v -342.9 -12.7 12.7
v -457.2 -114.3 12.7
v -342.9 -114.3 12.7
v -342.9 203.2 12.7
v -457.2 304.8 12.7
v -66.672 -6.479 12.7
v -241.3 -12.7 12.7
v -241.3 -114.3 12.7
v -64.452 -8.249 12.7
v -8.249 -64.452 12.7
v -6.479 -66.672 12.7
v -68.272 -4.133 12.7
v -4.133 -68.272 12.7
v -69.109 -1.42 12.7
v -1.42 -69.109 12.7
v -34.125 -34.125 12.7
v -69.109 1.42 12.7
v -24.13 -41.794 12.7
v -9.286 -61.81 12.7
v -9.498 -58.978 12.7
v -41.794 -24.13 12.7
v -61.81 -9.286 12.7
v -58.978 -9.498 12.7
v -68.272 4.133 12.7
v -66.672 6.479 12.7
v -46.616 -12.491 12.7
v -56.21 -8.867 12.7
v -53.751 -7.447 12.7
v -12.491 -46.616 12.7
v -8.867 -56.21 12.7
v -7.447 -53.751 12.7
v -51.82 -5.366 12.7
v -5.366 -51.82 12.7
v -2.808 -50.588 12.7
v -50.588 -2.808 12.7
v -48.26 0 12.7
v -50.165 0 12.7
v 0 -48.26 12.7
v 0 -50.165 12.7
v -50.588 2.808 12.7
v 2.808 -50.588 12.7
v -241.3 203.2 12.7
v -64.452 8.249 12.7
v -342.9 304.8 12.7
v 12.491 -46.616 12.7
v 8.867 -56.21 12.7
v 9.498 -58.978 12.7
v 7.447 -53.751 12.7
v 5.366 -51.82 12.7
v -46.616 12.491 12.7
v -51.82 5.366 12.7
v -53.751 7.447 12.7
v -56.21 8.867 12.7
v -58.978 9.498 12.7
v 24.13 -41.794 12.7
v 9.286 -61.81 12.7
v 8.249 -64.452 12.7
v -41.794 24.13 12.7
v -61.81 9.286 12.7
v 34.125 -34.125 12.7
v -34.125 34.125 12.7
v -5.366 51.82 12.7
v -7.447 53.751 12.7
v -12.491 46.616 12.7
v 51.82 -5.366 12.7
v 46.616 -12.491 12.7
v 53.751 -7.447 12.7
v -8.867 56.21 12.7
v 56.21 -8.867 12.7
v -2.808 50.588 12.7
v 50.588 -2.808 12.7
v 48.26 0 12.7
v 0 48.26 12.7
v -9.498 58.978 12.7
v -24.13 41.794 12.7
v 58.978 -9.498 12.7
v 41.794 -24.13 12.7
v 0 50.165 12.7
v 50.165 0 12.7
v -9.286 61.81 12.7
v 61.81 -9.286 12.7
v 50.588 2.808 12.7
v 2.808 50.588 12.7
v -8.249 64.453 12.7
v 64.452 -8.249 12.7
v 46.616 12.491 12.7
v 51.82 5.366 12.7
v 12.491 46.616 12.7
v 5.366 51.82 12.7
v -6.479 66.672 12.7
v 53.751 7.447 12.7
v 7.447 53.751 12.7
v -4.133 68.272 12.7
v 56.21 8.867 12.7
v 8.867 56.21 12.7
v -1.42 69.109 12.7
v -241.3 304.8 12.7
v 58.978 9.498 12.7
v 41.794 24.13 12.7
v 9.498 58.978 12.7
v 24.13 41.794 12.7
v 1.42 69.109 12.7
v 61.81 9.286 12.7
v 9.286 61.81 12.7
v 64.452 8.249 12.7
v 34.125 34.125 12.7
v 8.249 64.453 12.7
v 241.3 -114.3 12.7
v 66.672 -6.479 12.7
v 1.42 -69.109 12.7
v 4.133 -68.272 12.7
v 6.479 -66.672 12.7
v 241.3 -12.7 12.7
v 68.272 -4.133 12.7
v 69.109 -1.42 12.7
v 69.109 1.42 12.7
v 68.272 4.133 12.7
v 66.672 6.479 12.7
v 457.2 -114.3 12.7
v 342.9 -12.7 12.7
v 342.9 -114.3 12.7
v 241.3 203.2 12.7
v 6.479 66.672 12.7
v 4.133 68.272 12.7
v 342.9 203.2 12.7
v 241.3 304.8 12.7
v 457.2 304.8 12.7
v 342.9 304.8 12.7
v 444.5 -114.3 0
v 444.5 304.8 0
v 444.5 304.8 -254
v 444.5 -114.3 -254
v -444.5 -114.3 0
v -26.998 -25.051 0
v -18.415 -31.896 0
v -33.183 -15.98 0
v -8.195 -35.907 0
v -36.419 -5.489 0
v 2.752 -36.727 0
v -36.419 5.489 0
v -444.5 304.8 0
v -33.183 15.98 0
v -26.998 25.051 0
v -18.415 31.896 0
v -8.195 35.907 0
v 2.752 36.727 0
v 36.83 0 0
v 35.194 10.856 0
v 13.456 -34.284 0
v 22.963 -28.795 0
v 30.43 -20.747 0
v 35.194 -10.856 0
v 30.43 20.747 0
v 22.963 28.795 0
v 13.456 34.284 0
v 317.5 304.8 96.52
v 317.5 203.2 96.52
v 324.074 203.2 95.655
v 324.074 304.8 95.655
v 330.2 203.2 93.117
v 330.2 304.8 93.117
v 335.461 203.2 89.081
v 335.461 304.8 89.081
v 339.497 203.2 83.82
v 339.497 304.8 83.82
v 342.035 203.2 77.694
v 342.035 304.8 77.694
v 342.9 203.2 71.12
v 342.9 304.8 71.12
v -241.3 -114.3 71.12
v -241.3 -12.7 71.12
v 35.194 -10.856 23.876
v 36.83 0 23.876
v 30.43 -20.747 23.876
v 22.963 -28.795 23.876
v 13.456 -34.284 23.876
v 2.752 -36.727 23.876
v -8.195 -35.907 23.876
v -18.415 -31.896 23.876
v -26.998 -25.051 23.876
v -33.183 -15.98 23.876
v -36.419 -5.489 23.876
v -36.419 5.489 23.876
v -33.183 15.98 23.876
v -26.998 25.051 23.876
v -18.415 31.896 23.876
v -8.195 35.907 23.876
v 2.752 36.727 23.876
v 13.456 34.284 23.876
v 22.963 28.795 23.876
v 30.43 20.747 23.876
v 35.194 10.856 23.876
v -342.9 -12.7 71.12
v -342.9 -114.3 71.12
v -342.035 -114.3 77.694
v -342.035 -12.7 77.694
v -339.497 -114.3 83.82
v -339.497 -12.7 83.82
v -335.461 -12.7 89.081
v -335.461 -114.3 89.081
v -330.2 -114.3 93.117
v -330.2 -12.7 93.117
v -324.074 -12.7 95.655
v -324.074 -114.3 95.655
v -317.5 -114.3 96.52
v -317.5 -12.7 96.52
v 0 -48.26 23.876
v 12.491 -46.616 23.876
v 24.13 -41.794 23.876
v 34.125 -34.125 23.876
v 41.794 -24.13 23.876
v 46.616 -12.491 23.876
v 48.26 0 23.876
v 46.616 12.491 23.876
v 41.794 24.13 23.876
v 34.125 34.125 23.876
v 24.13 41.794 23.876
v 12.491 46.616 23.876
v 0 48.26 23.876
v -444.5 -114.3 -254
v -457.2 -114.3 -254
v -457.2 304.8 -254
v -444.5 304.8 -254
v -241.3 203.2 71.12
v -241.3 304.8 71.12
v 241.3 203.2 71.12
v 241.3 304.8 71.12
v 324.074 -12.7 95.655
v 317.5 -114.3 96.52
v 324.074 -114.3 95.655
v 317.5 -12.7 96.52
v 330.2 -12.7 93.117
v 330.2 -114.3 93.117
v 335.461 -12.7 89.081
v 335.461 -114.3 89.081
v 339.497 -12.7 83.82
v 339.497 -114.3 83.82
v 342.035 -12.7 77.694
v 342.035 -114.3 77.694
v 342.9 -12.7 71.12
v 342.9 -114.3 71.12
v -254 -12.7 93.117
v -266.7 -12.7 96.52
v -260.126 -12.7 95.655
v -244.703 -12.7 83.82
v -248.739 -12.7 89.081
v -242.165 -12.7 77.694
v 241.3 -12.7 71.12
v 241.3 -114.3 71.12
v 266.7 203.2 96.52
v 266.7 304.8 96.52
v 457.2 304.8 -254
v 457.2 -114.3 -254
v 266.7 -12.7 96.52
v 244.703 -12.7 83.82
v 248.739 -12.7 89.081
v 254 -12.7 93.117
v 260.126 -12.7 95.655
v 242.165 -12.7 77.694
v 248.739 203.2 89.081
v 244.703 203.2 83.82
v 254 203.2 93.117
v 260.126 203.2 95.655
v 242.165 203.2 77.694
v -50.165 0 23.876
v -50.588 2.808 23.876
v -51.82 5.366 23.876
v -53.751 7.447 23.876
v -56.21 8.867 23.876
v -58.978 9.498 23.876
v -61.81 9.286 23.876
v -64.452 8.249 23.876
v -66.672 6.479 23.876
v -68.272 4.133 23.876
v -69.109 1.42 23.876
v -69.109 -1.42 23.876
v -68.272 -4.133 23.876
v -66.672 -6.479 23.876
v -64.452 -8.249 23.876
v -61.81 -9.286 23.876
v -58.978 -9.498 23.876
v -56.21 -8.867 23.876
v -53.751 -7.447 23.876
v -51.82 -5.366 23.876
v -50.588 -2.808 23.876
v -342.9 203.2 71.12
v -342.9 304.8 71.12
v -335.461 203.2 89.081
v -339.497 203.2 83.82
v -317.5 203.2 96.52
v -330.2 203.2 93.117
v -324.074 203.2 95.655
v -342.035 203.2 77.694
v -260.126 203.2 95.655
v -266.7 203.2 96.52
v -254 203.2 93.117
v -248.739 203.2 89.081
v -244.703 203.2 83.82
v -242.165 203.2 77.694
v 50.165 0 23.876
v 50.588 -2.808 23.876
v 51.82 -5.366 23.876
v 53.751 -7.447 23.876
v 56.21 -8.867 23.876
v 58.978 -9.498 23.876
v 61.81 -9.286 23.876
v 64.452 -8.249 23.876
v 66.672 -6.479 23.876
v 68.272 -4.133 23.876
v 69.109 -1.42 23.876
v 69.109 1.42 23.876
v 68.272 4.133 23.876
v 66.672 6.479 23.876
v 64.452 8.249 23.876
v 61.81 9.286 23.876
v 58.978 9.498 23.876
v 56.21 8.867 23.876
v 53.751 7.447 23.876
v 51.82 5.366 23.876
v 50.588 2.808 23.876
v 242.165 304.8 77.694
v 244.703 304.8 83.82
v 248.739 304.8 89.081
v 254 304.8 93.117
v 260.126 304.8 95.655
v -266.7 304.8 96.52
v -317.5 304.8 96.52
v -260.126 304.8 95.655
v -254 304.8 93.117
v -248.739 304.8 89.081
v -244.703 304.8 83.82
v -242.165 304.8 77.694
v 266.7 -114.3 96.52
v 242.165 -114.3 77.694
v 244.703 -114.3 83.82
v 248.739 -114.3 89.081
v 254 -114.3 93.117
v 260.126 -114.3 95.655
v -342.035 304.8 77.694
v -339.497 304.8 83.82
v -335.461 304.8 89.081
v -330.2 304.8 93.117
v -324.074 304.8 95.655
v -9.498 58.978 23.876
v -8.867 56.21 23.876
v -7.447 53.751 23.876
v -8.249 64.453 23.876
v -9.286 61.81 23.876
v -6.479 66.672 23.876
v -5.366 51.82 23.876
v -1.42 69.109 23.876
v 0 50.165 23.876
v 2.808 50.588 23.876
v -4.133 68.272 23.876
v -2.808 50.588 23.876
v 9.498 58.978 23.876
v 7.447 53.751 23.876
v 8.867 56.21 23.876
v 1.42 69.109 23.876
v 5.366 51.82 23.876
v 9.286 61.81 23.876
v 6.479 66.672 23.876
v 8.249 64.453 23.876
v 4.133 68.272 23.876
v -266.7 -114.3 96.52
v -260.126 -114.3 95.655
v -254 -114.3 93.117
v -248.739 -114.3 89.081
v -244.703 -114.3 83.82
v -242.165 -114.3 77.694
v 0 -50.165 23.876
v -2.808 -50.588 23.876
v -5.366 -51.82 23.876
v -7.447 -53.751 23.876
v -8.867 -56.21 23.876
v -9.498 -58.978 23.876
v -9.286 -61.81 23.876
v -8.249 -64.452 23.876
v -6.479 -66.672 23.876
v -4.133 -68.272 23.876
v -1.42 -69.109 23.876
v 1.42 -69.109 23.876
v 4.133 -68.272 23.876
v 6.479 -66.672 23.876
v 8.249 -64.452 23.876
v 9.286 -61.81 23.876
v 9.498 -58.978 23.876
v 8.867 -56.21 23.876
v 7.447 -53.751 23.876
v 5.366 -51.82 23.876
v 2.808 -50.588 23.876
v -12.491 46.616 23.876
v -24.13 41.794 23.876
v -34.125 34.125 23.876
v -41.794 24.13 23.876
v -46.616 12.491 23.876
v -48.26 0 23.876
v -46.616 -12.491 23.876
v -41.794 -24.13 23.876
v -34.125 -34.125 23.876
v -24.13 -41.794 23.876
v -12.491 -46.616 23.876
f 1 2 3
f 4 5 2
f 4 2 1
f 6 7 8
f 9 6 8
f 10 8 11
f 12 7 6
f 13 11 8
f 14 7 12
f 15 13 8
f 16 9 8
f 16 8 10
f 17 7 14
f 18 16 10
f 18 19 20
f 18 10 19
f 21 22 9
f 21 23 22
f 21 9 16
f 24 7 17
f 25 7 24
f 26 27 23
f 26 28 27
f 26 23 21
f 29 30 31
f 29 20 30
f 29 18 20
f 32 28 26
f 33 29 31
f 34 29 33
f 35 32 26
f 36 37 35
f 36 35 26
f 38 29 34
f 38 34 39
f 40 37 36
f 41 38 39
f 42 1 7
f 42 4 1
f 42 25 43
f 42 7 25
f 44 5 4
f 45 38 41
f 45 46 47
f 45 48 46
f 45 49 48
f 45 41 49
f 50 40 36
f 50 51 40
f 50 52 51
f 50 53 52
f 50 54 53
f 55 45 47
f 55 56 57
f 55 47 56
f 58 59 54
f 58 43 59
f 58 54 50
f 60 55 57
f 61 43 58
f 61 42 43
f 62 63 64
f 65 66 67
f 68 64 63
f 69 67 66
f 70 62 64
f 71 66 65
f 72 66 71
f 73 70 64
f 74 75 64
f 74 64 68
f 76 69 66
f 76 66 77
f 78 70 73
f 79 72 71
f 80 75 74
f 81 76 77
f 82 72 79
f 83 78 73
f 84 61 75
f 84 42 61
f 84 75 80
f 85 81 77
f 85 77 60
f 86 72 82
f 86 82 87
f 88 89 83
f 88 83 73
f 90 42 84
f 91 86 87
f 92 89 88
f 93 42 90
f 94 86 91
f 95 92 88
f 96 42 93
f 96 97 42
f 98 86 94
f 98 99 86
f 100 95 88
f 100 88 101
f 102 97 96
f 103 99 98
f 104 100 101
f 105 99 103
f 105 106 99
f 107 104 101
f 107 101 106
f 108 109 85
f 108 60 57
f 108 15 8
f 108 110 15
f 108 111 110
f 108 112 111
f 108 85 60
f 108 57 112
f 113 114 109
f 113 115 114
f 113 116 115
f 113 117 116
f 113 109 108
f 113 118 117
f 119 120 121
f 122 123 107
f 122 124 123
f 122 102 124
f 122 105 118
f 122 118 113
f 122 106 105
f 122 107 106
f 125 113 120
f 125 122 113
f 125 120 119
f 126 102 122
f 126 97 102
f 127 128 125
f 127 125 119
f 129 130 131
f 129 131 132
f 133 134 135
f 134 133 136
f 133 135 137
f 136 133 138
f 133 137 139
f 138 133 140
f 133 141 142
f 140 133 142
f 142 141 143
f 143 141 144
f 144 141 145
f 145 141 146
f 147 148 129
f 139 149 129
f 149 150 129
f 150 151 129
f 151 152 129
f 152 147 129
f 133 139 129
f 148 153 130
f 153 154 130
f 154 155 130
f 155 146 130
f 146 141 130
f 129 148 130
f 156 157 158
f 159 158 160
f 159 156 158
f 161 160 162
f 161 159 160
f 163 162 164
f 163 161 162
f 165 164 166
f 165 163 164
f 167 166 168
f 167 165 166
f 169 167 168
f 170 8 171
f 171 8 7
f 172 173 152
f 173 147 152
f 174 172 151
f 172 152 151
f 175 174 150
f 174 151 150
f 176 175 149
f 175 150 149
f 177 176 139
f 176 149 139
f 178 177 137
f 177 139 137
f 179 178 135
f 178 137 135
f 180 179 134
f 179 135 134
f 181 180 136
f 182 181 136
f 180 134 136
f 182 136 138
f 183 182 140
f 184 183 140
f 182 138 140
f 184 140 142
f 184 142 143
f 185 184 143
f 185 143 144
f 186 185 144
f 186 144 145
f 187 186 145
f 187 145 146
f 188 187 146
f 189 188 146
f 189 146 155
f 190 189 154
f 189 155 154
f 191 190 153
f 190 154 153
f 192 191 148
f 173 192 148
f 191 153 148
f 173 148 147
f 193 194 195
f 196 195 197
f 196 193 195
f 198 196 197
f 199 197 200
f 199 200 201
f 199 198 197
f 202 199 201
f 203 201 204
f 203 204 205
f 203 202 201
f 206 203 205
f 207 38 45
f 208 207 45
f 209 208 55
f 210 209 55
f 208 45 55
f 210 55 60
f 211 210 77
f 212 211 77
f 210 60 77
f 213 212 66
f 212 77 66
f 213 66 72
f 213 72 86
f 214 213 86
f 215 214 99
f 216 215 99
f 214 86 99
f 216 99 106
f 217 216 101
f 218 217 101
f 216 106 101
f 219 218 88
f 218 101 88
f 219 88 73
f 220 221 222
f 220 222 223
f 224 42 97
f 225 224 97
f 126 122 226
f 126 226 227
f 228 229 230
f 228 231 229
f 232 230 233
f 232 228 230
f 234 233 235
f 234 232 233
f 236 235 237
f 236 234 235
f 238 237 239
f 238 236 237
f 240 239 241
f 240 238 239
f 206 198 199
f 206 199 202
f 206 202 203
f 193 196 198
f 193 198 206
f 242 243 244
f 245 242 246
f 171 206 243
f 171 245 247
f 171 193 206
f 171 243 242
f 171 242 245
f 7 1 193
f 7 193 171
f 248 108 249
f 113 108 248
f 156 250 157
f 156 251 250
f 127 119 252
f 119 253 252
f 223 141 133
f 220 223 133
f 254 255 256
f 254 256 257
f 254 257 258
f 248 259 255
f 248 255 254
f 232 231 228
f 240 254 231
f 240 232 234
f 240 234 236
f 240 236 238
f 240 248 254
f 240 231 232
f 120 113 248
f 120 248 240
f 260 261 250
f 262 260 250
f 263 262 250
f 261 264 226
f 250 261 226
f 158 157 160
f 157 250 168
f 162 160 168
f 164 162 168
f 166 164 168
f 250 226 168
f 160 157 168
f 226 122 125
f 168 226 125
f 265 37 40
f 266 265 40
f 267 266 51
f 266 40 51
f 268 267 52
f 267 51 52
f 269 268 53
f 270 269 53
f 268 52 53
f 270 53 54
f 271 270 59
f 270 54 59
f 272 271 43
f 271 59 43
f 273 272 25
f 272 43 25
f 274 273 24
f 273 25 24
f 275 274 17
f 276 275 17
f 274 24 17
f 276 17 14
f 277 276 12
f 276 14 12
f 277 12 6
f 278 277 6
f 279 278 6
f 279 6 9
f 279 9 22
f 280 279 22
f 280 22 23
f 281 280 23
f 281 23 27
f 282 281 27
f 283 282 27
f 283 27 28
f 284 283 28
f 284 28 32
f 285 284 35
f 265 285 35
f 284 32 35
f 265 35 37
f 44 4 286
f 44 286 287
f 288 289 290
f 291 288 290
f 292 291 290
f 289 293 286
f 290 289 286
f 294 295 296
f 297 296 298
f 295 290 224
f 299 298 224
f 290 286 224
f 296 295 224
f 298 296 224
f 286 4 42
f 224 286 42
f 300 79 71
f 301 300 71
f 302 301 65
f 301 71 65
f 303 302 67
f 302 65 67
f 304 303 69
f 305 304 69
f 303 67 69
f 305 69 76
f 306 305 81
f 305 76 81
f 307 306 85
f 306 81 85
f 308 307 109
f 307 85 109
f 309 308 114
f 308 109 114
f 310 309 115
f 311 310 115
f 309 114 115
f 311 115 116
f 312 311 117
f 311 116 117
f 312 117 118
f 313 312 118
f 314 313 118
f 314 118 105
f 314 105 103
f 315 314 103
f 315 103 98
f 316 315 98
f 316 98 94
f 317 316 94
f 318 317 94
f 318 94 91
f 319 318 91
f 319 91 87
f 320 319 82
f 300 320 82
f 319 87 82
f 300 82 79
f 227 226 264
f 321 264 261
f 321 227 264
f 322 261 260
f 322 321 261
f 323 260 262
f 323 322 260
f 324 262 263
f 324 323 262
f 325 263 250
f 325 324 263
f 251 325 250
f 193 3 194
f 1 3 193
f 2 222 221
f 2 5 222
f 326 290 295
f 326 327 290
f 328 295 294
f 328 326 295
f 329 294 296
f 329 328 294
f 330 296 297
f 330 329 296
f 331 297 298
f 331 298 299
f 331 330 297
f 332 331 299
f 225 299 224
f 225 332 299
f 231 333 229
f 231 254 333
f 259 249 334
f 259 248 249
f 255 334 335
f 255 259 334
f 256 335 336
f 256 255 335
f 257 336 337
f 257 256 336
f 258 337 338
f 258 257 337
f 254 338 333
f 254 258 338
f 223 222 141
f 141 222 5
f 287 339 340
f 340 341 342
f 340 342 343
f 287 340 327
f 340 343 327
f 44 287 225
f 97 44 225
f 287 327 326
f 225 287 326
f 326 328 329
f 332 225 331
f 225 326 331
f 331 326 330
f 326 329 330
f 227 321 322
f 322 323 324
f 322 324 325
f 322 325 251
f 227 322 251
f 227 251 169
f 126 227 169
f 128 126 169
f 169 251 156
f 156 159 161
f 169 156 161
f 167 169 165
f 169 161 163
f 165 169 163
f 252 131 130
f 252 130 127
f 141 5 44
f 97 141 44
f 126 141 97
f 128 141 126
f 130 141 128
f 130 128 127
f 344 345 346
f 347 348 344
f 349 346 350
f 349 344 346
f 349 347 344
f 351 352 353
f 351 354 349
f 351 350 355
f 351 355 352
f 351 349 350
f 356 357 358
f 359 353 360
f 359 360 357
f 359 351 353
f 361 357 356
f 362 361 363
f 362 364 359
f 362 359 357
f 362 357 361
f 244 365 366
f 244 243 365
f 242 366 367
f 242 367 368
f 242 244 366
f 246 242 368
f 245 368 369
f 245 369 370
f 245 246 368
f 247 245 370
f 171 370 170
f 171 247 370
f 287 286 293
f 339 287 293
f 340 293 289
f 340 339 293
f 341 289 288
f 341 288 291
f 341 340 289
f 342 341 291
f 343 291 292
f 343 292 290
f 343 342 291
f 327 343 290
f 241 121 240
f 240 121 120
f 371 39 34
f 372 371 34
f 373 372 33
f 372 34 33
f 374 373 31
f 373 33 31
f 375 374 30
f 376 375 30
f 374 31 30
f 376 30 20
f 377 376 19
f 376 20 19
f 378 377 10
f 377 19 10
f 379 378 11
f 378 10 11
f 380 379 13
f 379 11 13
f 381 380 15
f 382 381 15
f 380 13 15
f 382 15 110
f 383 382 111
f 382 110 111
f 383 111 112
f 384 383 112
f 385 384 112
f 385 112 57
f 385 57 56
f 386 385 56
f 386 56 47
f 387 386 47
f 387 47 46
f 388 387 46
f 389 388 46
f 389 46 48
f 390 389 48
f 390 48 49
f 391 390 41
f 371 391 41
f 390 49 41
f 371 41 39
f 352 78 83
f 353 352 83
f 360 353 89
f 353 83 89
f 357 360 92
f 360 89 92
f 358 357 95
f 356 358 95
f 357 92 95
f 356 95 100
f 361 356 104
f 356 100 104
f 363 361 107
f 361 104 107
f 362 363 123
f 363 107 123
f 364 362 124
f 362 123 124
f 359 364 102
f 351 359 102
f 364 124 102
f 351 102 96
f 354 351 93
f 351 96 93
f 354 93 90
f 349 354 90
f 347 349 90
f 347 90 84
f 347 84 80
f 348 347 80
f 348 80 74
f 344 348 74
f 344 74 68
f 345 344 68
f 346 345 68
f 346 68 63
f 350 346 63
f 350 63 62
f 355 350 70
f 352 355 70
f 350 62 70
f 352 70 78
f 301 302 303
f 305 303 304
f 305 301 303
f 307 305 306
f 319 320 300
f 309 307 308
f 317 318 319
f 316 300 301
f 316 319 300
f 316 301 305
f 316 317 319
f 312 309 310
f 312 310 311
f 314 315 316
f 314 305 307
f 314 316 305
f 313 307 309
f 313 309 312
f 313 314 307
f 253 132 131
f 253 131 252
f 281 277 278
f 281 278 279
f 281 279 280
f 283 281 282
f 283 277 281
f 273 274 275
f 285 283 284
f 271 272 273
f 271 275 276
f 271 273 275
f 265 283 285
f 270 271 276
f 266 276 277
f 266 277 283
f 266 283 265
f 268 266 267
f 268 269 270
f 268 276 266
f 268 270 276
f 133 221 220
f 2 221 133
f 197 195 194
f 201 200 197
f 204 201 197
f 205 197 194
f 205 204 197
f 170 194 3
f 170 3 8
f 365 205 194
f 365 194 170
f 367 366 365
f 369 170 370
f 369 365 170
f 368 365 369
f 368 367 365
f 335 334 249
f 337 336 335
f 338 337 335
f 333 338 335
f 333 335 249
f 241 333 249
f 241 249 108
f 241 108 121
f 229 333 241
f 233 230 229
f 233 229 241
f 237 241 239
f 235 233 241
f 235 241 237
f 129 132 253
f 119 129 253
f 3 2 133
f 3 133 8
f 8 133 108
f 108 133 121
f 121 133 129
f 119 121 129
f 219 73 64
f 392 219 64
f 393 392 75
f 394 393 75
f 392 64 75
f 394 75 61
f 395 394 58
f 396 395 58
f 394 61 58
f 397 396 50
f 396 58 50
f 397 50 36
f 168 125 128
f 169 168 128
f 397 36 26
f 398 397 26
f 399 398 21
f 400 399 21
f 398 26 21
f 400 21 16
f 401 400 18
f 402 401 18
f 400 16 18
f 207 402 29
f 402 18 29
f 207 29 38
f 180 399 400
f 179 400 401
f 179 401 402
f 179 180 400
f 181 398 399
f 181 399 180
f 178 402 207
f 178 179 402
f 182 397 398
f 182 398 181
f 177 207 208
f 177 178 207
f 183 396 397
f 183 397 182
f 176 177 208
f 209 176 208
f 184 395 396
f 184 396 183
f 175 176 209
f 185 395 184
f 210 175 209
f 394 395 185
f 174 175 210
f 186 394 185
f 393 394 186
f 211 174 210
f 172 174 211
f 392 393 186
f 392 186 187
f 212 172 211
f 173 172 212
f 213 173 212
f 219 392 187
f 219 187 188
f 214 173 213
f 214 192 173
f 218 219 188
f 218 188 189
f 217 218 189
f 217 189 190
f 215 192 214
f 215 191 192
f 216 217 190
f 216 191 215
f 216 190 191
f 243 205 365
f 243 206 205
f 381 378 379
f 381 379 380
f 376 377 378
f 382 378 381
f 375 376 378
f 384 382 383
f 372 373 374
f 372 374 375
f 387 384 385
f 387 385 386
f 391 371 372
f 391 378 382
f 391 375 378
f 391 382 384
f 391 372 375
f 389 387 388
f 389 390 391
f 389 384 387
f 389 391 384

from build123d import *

# Parameters (mm, degrees)
F0_W     = 914.4
F0_H     = 419.1
F1_DEPTH = 12.7
F2_R     = 36.83
F3_DEPTH = 12.7
F4_R     = 9.525
F5_DEPTH = 11.176
F6_W     = 101.6
F6_H     = 101.6
F7_DEPTH = 83.82
F8_W     = 12.7
F8_H     = 419.1
F9_DEPTH = 254
F10_R    = 25.4


with BuildPart() as f1:
    # F0 (on Top) → F1 (new body)
    with BuildSketch(Plane.XY):
        with Locations((0, 95.25)):
            Rectangle(F0_W, F0_H)
    extrude(amount=F1_DEPTH)

    # F2 (on face) → F3 (cut)
    with BuildSketch(Plane.XY.offset(12.7)):
        Circle(F2_R)
    extrude(amount=-F3_DEPTH, mode=Mode.SUBTRACT)

    # F4 (on face) → F5 (join)
    with BuildSketch(Plane.XY.offset(12.7)):
        with BuildLine():
            ThreePointArc((9.525, 59.69), (-6.7351920908, 66.4251920908), (0, 50.165))
            ThreePointArc((0, 50.165), (6.7351920908, 52.9548079092), (9.525, 59.69))
        make_face()
        with BuildLine():
            Line((36.83, 0), (48.26, 0))
            ThreePointArc((48.26, 0), (34.1249732601, 34.1249732601), (0, 48.26))
            Line((0, 48.26), (0, 36.83))
            ThreePointArc((0, 36.83), (26.0427427511, 26.0427427511), (36.83, 0))
        make_face()
        with BuildLine():
            Line((0, 36.83), (0, 48.26))
            ThreePointArc((0, 48.26), (-34.1249732601, 34.1249732601), (-48.26, 0))
            Line((-48.26, 0), (-36.83, 0))
            ThreePointArc((-36.83, 0), (-26.0427427511, 26.0427427511), (0, 36.83))
        make_face()
        with BuildLine():
            ThreePointArc((-48.26, 0), (-34.1249732601, -34.1249732601), (0, -48.26))
            Line((0, -48.26), (0, -36.83))
            ThreePointArc((0, -36.83), (-26.0427427511, -26.0427427511), (-36.83, 0))
            Line((-36.83, 0), (-48.26, 0))
        make_face()
        with BuildLine():
            ThreePointArc((0, -48.26), (34.1249732601, -34.1249732601), (48.26, 0))
            Line((48.26, 0), (36.83, 0))
            ThreePointArc((36.83, 0), (26.0427427511, -26.0427427511), (0, -36.83))
            Line((0, -36.83), (0, -48.26))
        make_face()
        with Locations((-59.69, 0)):
            Circle(F4_R)
        with BuildLine():
            ThreePointArc((9.525, -59.69), (6.7351920908, -52.9548079092), (0, -50.165))
            ThreePointArc((0, -50.165), (-6.7351920908, -66.4251920908), (9.525, -59.69))
        make_face()
        with BuildLine():
            ThreePointArc((69.215, 0), (59.69, 9.525), (50.165, 0))
            ThreePointArc((50.165, 0), (59.69, -9.525), (69.215, 0))
        make_face()
    extrude(amount=F5_DEPTH)

    # F6 (on face) → F7 (join)
    with BuildSketch(Plane.XY.offset(12.7)):
        with Locations((-292.1, 254)):
            Rectangle(F6_W, F6_H)
        with Locations((-292.1, -63.5)):
            Rectangle(F6_W, F6_H)
        with Locations((292.1, -63.5)):
            Rectangle(F6_W, F6_H)
        with Locations((292.1, 254)):
            Rectangle(F6_W, F6_H)
    extrude(amount=F7_DEPTH)

    # F8 (on face) → F9 (join)
    with BuildSketch(Plane(origin=(0, 0, 0), x_dir=(1, 0, 0), z_dir=(0, 0, -1))):
        with Locations((-450.85, -95.25)):
            Rectangle(F8_W, F8_H)
        with Locations((450.85, -95.25)):
            Rectangle(F8_W, F8_H)
    extrude(amount=F9_DEPTH)

    # F10
    f10_edges = [f1.edges().sort_by_distance(p)[0] for p in [
        (-342.9, -63.5, 96.52),
        (-342.9, 254, 96.52),
        (-241.3, 254, 96.52),
        (-241.3, -63.5, 96.52),
        (241.3, -63.5, 96.52),
        (241.3, 254, 96.52),
        (342.9, 254, 96.52),
        (342.9, -63.5, 96.52),
    ]]
    fillet(f10_edges, radius=F10_R)


solid = f1.part
